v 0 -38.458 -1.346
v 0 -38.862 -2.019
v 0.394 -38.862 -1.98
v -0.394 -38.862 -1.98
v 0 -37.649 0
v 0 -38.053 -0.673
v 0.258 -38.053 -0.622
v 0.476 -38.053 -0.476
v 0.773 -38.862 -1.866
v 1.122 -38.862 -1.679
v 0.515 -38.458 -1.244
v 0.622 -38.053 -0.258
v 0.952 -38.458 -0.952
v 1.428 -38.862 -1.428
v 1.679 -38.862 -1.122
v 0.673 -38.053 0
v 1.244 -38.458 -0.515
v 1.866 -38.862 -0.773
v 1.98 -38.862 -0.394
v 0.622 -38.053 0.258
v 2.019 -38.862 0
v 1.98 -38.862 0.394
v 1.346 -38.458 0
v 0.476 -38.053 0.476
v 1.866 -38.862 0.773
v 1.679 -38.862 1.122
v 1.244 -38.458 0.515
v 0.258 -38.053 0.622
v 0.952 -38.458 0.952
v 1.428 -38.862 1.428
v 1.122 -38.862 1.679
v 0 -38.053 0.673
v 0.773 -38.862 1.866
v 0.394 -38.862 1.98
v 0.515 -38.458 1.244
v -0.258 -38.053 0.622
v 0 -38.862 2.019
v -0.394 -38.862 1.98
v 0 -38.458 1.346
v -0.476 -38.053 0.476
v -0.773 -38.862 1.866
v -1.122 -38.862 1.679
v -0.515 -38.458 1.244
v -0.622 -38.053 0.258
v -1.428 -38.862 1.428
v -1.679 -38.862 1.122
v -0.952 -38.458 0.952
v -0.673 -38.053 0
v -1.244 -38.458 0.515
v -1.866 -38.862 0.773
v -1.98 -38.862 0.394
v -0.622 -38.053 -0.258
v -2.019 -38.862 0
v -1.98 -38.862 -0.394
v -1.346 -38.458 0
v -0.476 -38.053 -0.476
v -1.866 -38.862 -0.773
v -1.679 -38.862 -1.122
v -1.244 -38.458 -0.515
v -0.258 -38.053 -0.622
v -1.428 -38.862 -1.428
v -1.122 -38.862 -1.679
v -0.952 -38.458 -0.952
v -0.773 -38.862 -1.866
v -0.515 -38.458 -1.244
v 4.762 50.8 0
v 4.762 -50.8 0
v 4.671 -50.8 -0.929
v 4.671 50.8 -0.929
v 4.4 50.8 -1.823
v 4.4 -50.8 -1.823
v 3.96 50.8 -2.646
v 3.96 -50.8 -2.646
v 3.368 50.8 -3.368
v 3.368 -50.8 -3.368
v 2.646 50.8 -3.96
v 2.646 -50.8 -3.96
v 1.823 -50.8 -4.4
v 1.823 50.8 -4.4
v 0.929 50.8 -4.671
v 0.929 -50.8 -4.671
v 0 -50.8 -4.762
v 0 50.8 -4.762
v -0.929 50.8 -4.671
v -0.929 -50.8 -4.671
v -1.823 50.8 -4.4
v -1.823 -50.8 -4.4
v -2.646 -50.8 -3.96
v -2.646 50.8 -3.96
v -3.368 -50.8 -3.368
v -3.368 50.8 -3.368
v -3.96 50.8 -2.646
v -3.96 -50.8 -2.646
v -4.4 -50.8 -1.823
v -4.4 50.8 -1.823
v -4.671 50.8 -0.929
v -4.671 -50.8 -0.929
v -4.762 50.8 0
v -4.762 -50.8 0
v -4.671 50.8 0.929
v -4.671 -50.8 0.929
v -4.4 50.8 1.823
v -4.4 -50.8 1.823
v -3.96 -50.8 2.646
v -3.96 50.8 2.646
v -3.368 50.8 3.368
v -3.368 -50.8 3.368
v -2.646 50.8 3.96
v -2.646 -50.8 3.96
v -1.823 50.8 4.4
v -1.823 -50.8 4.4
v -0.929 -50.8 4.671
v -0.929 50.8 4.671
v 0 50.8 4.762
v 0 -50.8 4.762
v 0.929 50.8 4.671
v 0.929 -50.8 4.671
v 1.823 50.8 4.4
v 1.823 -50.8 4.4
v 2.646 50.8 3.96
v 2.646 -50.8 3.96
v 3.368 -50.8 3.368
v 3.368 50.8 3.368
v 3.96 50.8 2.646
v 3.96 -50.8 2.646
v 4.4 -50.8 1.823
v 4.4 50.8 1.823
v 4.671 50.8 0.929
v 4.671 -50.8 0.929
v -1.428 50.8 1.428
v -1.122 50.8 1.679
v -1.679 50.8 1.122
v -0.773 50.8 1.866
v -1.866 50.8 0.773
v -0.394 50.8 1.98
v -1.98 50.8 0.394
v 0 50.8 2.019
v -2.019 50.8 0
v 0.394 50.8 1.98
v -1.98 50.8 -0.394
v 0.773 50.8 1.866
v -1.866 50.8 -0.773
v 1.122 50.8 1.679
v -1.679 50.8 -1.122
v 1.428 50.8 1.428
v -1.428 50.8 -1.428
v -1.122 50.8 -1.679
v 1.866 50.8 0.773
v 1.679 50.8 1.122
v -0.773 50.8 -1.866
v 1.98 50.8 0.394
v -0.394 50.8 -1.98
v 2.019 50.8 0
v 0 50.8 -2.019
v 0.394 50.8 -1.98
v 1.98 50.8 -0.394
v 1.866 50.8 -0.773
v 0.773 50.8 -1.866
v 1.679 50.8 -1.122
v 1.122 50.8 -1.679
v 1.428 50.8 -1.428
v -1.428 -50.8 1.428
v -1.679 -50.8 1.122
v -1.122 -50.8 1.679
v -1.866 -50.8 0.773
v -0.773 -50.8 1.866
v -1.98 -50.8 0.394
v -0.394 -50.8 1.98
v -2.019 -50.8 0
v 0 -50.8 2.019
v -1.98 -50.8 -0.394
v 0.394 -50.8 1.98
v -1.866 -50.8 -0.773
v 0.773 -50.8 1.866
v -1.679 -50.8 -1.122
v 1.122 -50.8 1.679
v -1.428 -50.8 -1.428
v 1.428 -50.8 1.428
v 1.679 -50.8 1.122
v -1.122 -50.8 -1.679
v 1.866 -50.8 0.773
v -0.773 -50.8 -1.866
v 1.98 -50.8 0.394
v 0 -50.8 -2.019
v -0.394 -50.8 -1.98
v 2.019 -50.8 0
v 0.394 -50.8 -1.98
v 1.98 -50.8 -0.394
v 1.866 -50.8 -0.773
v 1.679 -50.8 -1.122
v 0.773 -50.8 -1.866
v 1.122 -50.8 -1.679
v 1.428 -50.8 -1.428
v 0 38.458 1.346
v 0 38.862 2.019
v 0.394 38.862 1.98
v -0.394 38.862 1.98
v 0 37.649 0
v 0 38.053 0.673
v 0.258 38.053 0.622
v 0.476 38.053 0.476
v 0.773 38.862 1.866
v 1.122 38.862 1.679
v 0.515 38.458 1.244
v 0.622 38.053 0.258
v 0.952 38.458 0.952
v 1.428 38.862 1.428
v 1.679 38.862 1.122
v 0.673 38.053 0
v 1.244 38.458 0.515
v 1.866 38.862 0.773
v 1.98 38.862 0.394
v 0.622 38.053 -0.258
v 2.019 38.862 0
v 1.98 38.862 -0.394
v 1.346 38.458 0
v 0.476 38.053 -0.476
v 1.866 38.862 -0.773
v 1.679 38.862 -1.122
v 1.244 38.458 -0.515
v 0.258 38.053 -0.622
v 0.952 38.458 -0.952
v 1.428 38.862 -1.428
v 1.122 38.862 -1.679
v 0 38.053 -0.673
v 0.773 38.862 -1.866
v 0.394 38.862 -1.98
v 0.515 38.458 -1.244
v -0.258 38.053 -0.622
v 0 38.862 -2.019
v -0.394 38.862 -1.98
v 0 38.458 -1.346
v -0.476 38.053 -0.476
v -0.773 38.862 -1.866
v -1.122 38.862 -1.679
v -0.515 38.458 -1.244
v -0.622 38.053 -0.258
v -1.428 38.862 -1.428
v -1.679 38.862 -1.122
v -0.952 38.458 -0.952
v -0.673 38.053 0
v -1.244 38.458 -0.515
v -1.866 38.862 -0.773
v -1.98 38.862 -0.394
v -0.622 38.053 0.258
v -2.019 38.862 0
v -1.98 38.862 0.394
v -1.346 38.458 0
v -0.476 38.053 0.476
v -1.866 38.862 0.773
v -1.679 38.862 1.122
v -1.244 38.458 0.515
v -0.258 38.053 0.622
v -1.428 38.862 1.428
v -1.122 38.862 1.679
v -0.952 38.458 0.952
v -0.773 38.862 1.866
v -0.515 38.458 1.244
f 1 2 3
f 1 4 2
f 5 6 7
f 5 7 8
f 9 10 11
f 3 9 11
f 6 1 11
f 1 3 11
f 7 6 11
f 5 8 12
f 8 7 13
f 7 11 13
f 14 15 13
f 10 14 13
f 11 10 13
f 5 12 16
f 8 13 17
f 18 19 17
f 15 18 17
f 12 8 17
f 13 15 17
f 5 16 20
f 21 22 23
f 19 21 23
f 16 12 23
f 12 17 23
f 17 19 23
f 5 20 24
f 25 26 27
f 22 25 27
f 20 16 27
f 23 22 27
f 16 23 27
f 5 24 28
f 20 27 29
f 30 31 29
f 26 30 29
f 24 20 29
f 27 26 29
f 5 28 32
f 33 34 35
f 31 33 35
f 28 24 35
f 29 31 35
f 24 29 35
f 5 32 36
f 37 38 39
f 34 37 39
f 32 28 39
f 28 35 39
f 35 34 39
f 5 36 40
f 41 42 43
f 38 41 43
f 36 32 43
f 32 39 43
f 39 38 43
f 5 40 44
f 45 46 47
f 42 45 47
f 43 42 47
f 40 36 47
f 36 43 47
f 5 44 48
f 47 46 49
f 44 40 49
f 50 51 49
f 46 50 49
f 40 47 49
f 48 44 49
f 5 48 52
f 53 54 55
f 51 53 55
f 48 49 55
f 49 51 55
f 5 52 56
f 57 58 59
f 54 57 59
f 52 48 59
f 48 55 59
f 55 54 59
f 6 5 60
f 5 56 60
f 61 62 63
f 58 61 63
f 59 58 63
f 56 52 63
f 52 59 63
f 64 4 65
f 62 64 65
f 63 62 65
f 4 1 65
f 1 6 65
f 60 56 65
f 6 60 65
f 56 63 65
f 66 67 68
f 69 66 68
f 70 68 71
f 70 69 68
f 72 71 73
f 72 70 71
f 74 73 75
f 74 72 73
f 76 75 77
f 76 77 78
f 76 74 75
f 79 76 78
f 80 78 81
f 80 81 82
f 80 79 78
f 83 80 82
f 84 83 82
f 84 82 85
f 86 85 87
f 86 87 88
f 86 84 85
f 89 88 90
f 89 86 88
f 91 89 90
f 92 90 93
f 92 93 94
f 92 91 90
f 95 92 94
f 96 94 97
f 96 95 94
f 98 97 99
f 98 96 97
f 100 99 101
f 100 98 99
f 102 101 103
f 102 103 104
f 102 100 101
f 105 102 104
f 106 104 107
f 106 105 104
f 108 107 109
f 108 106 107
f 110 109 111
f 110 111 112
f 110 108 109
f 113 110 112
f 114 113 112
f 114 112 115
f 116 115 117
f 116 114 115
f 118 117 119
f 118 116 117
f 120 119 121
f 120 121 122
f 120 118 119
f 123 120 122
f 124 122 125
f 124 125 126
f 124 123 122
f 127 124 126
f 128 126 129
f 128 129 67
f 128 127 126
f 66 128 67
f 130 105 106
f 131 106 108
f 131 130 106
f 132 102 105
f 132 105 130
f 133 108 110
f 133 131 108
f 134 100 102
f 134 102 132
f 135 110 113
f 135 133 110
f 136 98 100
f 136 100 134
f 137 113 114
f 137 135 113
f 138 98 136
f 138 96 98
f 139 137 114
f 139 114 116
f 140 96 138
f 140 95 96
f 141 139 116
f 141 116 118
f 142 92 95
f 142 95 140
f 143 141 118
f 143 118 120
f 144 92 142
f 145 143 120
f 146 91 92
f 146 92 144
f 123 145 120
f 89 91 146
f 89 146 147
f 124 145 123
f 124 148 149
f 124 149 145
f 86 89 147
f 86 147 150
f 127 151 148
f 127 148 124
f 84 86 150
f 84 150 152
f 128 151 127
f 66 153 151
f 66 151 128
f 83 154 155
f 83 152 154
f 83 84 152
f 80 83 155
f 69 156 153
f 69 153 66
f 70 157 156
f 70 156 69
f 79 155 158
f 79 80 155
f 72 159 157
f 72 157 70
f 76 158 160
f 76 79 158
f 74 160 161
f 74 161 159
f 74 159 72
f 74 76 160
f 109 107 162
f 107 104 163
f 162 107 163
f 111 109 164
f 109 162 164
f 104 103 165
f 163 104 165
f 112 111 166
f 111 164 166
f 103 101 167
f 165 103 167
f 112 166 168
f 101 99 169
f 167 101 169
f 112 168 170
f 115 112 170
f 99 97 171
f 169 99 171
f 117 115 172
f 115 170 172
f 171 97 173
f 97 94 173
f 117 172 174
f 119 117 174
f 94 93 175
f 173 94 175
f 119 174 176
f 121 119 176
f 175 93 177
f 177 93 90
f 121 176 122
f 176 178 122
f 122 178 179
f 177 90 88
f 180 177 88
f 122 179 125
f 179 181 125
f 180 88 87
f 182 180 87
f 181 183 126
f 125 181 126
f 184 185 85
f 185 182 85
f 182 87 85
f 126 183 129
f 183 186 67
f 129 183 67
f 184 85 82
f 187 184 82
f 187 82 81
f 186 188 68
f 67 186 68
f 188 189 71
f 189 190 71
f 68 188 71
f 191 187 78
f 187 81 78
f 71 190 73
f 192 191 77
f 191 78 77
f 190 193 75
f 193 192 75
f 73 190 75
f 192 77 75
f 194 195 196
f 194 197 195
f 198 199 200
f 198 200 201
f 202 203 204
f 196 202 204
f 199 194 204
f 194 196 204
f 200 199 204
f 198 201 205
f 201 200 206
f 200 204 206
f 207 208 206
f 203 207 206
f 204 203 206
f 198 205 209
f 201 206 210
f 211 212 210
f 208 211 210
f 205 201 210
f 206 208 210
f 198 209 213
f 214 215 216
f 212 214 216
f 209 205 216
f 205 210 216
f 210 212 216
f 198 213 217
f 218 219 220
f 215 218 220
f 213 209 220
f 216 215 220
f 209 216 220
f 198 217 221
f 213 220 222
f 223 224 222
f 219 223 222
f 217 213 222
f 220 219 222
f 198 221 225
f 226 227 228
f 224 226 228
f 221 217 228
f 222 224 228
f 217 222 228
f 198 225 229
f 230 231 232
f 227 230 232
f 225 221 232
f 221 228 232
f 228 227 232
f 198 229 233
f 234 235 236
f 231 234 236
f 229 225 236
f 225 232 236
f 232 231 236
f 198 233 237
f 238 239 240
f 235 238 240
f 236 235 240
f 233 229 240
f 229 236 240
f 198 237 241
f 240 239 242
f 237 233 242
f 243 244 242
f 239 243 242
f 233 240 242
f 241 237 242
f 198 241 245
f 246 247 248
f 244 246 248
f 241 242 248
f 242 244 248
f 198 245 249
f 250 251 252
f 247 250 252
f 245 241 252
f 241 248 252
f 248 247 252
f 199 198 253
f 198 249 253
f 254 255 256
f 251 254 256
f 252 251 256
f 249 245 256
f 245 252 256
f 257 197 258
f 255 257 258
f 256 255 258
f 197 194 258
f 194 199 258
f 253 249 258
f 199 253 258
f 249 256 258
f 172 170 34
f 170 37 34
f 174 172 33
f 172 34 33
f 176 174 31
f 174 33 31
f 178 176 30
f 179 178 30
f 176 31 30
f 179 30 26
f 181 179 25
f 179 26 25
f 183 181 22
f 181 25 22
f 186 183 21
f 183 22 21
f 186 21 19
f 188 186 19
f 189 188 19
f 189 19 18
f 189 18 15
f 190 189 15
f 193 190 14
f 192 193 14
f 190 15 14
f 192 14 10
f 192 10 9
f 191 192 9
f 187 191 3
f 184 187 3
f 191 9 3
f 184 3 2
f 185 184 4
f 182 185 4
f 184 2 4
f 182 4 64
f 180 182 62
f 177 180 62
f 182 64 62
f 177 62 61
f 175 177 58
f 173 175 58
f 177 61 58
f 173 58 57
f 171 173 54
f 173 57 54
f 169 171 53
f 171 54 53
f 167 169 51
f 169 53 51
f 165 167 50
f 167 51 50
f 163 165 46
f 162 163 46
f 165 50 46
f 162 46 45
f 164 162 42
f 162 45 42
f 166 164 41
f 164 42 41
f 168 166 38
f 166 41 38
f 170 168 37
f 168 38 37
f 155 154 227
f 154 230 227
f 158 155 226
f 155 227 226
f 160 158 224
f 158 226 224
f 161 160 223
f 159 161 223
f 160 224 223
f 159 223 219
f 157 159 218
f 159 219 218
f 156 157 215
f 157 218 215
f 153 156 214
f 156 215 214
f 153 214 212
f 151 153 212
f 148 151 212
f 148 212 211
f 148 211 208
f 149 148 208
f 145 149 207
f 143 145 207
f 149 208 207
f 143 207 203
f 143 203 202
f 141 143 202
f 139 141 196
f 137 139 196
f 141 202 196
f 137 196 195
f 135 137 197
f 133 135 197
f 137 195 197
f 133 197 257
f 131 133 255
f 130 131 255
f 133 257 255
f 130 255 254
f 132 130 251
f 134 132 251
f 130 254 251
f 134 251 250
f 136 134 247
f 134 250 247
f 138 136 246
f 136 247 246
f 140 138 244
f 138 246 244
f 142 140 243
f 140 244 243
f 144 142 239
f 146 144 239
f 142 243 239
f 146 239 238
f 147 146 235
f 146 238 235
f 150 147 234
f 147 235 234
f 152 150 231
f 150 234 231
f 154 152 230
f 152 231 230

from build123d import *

# Parameters (mm, degrees)
SKETCH1_R                            = 4.7625
BOSS_EXTRUDE1_DEPTH                  = 50.8
F_10_32_TAPPED_HOLE1_D               = 4.0386
F_10_32_TAPPED_HOLE1_DEPTH           = 11.938
F_10_32_TAPPED_HOLE1_TIP             = 1.213317848
F_10_32_TAPPED_HOLE1_ON_FACE_2_D     = 4.0386
F_10_32_TAPPED_HOLE1_ON_FACE_2_DEPTH = 11.938
F_10_32_TAPPED_HOLE1_ON_FACE_2_TIP   = 1.213317848


with BuildPart() as part:
    # Sketch1 → Boss-Extrude1 (new body, symmetric)
    with BuildSketch(Plane(origin=(0, 0, 0), x_dir=(1, 0, 0), z_dir=(0, 1, 0))):
        Circle(SKETCH1_R)
    extrude(amount=BOSS_EXTRUDE1_DEPTH, both=True)

    # #10-32 Tapped Hole1
    with Locations(Plane.ZX.offset(50.8)):
        with Locations((0, 0)):
            Hole(F_10_32_TAPPED_HOLE1_D / 2, depth=F_10_32_TAPPED_HOLE1_DEPTH)
            with Locations((0, 0, -(F_10_32_TAPPED_HOLE1_DEPTH + F_10_32_TAPPED_HOLE1_TIP / 2))):  # 118° drill point
                Cone(0, F_10_32_TAPPED_HOLE1_D / 2, F_10_32_TAPPED_HOLE1_TIP, mode=Mode.SUBTRACT)

    # #10-32 Tapped Hole1 on face 2
    with Locations(Plane(origin=(0, -50.8, 0), x_dir=(0, 0, -1), z_dir=(0, -1, 0))):
        with Locations((0, 0)):
            Hole(F_10_32_TAPPED_HOLE1_ON_FACE_2_D / 2, depth=F_10_32_TAPPED_HOLE1_ON_FACE_2_DEPTH)
            with Locations((0, 0, -(F_10_32_TAPPED_HOLE1_ON_FACE_2_DEPTH + F_10_32_TAPPED_HOLE1_ON_FACE_2_TIP / 2))):  # 118° drill point
                Cone(0, F_10_32_TAPPED_HOLE1_ON_FACE_2_D / 2, F_10_32_TAPPED_HOLE1_ON_FACE_2_TIP, mode=Mode.SUBTRACT)


solid = part.part
